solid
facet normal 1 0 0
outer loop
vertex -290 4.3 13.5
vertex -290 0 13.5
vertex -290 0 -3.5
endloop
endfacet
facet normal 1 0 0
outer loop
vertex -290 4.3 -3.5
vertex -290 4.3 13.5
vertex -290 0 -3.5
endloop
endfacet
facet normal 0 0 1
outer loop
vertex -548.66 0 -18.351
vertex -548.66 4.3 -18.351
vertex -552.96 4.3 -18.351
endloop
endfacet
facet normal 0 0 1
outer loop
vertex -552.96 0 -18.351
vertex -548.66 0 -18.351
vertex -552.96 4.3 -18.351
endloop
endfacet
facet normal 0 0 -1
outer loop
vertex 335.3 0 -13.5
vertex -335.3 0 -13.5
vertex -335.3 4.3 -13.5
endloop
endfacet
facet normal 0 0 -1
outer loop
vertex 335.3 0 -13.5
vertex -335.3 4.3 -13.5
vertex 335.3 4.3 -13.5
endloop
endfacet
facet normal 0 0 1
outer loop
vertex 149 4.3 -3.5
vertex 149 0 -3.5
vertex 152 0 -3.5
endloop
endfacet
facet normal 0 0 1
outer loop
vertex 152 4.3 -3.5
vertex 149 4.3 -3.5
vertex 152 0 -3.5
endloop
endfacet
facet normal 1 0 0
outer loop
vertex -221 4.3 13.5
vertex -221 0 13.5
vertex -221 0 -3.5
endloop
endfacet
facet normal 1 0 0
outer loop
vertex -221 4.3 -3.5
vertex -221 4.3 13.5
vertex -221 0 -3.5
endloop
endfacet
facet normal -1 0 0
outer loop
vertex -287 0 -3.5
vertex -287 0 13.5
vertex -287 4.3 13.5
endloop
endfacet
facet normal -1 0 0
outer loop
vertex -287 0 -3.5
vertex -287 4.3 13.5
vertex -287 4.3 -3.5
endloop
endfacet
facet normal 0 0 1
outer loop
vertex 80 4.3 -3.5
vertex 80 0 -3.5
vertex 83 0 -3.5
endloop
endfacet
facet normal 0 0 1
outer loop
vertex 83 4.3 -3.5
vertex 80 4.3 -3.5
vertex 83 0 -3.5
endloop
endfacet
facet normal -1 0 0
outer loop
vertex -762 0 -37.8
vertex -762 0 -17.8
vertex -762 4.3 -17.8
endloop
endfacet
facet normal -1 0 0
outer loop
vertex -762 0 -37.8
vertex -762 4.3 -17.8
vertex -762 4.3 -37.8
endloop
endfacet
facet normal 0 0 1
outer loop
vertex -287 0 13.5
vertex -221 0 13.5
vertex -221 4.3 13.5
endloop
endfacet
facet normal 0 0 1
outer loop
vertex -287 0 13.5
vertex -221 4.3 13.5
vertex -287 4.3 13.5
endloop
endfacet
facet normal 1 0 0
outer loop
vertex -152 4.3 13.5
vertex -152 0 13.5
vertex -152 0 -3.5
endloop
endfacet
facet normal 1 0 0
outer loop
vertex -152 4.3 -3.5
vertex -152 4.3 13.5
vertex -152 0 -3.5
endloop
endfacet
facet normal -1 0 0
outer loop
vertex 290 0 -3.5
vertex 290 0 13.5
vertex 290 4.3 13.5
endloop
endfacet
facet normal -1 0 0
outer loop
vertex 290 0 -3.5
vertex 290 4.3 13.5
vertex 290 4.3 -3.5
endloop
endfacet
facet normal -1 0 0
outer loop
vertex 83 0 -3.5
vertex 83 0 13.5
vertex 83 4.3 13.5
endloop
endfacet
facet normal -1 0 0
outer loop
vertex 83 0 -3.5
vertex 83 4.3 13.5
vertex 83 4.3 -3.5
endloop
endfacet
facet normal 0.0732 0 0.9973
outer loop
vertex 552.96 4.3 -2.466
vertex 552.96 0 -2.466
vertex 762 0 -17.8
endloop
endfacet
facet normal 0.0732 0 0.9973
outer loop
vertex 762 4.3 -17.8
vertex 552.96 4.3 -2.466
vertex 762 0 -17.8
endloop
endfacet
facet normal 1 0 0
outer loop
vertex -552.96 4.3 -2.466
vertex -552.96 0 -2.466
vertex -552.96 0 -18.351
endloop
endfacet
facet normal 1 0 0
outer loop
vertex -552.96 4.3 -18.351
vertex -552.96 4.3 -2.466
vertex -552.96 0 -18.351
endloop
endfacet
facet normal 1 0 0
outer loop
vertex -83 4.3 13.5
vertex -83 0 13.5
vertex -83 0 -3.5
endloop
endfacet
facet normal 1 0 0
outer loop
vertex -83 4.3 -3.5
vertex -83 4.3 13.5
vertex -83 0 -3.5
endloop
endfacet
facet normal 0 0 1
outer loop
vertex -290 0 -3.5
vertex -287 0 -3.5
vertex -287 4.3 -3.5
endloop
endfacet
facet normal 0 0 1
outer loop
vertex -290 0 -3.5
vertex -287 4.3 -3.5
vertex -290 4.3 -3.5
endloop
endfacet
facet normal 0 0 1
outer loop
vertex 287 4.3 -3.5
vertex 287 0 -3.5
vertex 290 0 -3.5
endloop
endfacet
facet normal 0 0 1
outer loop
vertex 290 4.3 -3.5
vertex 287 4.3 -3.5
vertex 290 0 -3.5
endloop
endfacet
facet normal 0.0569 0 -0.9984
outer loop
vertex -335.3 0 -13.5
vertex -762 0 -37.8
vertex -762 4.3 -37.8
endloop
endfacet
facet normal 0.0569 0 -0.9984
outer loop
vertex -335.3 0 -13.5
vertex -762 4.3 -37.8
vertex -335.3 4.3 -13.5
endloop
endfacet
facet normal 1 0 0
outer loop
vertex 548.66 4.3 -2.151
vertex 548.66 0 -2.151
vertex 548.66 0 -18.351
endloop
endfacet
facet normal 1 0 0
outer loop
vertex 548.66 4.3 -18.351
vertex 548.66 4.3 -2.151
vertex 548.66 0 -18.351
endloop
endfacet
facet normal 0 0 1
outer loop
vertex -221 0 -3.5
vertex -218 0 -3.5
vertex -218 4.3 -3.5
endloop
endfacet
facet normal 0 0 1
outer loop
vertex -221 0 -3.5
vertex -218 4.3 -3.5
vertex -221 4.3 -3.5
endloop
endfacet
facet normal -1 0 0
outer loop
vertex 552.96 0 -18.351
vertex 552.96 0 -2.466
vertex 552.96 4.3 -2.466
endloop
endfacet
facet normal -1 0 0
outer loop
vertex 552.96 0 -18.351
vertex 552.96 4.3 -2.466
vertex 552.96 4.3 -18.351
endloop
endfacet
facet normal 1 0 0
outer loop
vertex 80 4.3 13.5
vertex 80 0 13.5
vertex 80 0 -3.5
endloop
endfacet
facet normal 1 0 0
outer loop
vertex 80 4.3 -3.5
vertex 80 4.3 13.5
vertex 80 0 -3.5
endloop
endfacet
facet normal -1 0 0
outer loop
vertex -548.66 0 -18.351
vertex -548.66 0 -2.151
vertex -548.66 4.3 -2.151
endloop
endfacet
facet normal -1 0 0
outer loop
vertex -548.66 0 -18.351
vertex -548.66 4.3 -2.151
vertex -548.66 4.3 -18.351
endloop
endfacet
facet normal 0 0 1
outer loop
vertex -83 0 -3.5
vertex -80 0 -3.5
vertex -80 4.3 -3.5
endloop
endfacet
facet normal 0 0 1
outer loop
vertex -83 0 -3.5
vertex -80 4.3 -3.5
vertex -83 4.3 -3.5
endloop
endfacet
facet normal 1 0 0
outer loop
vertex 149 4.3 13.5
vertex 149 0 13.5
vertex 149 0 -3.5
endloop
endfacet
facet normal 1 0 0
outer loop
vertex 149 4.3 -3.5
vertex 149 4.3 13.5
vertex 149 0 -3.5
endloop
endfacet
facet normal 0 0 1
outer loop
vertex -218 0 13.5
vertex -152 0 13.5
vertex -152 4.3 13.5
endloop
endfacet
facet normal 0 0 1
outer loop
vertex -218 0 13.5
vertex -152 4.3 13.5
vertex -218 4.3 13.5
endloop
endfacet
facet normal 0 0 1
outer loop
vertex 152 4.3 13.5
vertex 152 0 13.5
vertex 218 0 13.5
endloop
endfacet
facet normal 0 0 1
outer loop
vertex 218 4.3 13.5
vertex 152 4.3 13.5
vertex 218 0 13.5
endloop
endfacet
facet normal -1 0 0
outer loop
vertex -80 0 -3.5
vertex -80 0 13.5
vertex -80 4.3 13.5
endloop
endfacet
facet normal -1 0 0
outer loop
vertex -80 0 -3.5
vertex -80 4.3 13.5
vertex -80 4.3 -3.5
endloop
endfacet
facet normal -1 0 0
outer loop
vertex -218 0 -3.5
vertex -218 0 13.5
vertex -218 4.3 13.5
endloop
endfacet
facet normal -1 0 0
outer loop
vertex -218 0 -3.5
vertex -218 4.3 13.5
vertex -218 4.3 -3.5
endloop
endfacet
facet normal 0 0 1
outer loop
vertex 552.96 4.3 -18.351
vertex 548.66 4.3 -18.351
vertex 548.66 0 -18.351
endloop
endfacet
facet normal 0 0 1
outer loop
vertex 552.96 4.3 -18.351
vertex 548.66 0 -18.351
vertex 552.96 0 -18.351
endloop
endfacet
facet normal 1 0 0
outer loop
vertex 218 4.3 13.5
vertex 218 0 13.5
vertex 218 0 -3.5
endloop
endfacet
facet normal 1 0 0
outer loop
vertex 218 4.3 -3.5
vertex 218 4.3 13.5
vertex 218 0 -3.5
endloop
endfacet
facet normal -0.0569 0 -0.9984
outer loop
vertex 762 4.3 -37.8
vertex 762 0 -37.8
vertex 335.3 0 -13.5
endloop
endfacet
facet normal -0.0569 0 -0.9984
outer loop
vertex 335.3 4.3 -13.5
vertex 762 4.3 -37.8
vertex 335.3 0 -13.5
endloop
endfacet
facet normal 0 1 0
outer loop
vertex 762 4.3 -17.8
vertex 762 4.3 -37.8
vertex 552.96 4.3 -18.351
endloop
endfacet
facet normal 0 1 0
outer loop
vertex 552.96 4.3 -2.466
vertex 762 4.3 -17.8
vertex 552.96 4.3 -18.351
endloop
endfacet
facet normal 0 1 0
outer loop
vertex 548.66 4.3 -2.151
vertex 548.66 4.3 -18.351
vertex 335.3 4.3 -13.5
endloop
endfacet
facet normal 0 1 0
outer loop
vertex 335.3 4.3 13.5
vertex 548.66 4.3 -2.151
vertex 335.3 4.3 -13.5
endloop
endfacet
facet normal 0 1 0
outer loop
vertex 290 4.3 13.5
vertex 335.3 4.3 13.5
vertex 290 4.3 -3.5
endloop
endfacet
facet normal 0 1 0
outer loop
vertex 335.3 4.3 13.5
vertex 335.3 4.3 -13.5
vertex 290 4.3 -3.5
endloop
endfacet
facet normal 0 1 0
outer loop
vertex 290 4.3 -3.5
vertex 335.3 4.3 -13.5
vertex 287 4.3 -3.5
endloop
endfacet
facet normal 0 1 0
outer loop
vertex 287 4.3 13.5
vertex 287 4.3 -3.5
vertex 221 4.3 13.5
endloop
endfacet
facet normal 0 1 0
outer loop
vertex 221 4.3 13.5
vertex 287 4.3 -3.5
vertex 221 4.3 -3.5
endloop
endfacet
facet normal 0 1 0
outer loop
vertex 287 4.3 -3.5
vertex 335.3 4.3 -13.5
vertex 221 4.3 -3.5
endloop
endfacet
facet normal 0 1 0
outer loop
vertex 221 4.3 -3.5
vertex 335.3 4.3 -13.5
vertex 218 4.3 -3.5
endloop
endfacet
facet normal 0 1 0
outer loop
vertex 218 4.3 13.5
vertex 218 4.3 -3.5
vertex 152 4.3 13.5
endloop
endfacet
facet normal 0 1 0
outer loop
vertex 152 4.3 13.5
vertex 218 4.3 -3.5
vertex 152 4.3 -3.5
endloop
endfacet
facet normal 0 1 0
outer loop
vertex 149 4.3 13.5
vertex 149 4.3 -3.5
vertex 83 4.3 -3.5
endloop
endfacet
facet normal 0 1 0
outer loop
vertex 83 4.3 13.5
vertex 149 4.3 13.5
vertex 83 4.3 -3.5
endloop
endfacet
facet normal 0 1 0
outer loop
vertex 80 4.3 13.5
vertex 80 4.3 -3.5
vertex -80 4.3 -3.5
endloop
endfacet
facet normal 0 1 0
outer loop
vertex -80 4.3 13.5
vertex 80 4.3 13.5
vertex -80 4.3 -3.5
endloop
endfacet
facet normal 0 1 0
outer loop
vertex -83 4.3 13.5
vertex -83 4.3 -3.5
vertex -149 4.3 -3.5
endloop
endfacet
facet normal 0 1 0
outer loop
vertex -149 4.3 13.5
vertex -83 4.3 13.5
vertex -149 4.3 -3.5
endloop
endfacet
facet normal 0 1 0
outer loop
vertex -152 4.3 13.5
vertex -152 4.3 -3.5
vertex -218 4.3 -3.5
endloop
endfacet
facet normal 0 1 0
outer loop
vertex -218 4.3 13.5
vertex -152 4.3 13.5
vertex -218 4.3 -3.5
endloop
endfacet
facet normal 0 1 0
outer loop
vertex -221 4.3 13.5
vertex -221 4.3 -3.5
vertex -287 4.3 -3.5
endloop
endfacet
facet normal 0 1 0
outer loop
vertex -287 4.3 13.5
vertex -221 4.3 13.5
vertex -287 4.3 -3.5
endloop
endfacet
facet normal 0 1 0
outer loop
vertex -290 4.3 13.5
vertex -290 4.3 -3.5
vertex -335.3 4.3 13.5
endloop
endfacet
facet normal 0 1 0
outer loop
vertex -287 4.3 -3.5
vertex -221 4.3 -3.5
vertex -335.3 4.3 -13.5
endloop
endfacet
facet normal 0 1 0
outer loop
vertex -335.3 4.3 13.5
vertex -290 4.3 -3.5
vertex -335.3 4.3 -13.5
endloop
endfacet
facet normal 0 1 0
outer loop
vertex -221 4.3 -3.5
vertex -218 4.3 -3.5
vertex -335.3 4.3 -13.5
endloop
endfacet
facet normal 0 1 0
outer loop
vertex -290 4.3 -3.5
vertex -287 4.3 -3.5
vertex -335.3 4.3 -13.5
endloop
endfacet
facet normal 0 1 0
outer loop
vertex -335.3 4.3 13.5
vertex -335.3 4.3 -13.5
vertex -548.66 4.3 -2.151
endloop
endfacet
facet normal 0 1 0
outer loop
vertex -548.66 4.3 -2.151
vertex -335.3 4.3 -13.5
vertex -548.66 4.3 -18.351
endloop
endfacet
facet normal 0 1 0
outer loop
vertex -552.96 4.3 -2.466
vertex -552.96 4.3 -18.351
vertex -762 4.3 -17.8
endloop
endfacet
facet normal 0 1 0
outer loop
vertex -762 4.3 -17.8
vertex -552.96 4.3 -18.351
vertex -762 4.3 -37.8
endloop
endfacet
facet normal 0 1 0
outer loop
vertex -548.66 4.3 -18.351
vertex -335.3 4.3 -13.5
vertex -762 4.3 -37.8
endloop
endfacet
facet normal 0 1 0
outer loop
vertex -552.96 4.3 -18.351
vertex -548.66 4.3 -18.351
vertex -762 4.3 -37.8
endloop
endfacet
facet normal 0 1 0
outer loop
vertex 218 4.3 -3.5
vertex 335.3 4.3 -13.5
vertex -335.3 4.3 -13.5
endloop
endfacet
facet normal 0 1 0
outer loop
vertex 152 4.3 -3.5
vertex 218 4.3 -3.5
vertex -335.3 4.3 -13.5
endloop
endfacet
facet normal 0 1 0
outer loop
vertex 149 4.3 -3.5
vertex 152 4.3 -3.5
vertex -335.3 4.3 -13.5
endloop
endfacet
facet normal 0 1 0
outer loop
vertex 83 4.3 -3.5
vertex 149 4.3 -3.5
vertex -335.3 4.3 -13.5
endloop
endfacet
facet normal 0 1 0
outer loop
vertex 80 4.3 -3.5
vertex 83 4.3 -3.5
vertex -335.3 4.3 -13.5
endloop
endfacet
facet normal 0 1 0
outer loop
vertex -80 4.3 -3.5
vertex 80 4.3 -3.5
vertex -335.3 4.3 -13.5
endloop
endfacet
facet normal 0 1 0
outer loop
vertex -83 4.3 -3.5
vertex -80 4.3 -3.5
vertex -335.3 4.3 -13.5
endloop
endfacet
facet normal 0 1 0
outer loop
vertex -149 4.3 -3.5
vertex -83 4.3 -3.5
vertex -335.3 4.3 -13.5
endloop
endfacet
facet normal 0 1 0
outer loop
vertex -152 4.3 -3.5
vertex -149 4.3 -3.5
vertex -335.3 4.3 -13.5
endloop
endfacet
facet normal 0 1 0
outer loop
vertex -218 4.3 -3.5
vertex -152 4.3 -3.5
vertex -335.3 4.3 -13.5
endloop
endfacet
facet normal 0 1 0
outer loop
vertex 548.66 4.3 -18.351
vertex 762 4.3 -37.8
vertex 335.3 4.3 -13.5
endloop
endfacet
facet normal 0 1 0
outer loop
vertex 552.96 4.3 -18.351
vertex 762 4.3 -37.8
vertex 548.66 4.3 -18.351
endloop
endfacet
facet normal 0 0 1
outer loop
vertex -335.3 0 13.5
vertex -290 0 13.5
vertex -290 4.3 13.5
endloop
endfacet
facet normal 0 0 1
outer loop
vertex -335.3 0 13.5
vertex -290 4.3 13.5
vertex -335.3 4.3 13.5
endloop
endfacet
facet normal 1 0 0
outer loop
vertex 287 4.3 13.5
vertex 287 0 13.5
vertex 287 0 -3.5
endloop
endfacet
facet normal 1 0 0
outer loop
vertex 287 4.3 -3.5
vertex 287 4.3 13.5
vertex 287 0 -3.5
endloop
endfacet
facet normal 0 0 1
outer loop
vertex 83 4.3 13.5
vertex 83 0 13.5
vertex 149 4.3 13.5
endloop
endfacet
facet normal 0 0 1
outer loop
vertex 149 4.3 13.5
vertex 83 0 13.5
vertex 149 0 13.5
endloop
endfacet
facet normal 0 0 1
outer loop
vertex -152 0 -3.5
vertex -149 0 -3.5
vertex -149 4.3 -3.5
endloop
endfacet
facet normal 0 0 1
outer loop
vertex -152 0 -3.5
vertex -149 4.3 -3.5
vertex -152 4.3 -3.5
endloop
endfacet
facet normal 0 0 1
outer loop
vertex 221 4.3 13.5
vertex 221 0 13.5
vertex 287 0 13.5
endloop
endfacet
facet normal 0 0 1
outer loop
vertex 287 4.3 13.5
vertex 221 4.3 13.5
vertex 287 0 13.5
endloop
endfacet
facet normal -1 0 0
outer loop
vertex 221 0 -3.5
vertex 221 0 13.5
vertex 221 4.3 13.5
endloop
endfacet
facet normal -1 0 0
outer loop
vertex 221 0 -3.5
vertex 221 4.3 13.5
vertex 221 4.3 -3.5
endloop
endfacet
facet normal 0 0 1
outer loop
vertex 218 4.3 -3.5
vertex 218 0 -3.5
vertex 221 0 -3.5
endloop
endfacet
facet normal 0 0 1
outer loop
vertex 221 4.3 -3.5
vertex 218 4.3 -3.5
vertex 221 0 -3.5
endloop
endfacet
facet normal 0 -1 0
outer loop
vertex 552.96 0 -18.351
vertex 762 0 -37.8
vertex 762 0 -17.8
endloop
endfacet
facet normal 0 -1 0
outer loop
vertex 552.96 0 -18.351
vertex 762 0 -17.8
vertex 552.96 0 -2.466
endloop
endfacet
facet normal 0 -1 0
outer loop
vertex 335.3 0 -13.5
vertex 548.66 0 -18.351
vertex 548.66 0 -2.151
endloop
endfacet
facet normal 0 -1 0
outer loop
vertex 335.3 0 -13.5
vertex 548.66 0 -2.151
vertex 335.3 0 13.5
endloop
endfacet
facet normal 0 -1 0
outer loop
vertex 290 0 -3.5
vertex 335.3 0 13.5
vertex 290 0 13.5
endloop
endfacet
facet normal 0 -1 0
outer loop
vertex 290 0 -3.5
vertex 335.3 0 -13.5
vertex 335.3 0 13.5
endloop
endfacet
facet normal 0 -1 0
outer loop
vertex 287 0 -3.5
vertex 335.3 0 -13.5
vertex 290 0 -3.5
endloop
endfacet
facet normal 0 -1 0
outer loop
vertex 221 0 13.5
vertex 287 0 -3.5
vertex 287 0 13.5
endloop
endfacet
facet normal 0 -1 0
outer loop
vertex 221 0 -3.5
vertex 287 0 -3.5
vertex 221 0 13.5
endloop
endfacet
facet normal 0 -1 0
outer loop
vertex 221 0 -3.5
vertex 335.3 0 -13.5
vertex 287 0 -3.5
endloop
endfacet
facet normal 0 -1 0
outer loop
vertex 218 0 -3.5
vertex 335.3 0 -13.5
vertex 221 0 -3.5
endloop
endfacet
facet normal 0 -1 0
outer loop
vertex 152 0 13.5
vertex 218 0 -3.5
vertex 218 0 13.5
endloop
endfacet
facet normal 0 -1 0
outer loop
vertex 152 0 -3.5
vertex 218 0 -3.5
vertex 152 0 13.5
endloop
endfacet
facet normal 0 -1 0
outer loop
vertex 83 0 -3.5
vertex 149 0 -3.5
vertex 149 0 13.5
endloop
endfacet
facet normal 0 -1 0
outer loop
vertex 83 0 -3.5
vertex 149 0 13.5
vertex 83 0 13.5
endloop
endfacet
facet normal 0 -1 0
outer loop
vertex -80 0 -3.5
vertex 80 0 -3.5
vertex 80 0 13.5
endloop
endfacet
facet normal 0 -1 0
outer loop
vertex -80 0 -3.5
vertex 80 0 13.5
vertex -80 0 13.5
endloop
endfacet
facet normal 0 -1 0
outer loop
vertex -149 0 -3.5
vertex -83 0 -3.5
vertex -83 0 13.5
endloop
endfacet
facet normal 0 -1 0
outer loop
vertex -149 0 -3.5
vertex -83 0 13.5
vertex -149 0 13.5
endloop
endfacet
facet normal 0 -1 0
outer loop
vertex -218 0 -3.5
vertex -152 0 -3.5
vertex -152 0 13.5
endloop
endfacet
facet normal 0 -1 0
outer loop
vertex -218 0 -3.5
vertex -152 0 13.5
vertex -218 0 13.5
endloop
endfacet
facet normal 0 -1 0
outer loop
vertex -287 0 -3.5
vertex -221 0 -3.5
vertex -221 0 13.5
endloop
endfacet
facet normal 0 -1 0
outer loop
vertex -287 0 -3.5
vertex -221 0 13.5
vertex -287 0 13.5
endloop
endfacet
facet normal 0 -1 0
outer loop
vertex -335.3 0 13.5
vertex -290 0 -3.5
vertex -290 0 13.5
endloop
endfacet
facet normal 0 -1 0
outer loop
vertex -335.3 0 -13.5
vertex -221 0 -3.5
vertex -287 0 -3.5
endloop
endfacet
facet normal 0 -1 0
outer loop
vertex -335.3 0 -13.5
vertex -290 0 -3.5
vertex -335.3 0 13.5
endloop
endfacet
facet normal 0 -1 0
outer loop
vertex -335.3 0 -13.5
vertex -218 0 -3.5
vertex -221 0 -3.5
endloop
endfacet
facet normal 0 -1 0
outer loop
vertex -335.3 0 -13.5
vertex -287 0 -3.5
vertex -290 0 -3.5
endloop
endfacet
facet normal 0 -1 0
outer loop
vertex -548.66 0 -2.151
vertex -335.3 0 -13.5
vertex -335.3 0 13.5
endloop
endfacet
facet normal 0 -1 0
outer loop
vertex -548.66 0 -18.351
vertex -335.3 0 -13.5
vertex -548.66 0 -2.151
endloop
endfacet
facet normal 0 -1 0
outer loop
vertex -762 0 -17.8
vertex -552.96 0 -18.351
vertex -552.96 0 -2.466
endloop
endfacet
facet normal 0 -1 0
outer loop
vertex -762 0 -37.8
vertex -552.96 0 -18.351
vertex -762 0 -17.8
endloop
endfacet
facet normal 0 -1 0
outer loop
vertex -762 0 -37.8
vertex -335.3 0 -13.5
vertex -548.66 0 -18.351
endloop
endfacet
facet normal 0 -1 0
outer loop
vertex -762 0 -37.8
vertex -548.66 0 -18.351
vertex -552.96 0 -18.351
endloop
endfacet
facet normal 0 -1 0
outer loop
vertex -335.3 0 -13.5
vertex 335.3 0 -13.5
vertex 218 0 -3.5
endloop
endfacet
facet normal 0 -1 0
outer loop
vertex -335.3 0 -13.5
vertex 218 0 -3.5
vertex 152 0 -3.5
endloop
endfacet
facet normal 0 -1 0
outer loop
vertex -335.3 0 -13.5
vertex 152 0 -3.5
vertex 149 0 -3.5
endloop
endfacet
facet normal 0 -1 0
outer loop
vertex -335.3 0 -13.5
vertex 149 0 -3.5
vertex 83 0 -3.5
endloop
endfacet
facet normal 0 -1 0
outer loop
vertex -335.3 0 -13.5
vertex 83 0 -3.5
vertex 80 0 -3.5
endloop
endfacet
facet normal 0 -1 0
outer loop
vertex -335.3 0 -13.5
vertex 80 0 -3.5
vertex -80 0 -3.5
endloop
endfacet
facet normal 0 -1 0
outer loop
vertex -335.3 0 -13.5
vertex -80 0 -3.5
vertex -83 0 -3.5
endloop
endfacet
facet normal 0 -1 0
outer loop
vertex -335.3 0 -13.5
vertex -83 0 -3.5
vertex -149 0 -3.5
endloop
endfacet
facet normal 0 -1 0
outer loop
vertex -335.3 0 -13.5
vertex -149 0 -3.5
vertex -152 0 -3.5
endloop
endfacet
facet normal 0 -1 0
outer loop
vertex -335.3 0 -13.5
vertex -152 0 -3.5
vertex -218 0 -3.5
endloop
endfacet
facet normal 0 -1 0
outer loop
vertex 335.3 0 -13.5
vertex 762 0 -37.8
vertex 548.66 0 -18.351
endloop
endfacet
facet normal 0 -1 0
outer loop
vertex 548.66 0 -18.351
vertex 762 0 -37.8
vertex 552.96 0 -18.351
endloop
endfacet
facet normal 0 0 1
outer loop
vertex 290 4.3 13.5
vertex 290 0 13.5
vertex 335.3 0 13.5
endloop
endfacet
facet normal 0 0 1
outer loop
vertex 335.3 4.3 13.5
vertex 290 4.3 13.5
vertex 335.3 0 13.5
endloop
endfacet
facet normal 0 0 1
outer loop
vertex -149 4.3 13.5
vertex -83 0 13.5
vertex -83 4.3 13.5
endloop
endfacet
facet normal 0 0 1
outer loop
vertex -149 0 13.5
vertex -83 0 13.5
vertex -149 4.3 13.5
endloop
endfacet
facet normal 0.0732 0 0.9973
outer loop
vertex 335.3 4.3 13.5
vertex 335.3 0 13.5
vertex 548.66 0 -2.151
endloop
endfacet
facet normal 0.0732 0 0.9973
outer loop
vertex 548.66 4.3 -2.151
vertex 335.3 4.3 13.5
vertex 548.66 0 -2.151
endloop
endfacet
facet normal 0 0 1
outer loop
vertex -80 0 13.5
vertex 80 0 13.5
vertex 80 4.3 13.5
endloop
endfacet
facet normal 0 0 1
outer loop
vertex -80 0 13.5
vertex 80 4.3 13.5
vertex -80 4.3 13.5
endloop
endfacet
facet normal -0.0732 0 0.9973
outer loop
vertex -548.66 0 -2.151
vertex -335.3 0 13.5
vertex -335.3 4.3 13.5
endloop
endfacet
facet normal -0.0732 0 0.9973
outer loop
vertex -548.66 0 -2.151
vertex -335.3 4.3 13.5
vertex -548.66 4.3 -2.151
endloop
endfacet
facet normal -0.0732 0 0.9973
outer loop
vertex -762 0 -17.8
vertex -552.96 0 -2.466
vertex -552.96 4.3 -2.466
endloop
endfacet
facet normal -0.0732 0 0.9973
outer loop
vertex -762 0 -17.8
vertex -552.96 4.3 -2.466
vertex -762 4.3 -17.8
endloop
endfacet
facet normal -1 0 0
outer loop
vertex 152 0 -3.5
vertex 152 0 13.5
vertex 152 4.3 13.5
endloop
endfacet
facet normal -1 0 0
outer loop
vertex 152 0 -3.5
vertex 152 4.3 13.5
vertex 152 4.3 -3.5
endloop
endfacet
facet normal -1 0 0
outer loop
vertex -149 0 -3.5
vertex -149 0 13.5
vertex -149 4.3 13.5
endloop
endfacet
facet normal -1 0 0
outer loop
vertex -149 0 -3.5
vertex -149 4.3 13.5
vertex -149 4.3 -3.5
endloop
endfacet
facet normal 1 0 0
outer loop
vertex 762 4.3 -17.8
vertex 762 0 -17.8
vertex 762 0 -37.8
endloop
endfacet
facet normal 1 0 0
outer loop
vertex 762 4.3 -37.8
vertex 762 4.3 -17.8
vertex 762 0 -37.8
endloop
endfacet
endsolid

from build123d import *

# Parameters (mm, degrees)
BOSS_EXTRUDE1_DEPTH = 4.3
CUT_EXTRUDE1_START  = -5.3
SKETCH2_W           = 3
SKETCH2_H           = 17
SKETCH2_W_2         = 4.3
SKETCH2_H_2         = 16.2
CUT_EXTRUDE1_DEPTH  = 6.3


with BuildPart() as part:
    # Sketch1 → Boss-Extrude1 (new body)
    with BuildSketch(Plane(origin=(0, 0, 0), x_dir=(1, 0, 0), z_dir=(0, 1, 0))):
        Polygon((335.3, -13.5), (762, 17.8), (762, 37.8), (335.3, 13.5), (0, 13.5), (0, -13.5), align=None)
    boss_extrude1 = extrude(amount=BOSS_EXTRUDE1_DEPTH)

    # Sketch2 → Cut-Extrude1 (cut)
    with BuildSketch(Plane(origin=(0, 4.3, 0), x_dir=(1, 0, 0), z_dir=(0, 1, 0)).offset(CUT_EXTRUDE1_START)):
        with Locations((81.5, -5)):
            Rectangle(SKETCH2_W, SKETCH2_H)
        with Locations((150.5, -5)):
            Rectangle(SKETCH2_W, SKETCH2_H)
        with Locations((219.5, -5)):
            Rectangle(SKETCH2_W, SKETCH2_H)
        with Locations((288.5, -5)):
            Rectangle(SKETCH2_W, SKETCH2_H)
        with Locations((550.81, 10.250733536)):
            Rectangle(SKETCH2_W_2, SKETCH2_H_2)
    cut_extrude1 = extrude(amount=CUT_EXTRUDE1_DEPTH, mode=Mode.SUBTRACT)

    # Mirror1: Boss-Extrude1, Cut-Extrude1 across plane
    add(boss_extrude1.mirror(Plane(origin=(0, 0, 0), x_dir=(0, 0, 1), z_dir=(1, 0, 0))))
    add(cut_extrude1.mirror(Plane(origin=(0, 0, 0), x_dir=(0, 0, 1), z_dir=(1, 0, 0))), mode=Mode.SUBTRACT)


solid = part.part
